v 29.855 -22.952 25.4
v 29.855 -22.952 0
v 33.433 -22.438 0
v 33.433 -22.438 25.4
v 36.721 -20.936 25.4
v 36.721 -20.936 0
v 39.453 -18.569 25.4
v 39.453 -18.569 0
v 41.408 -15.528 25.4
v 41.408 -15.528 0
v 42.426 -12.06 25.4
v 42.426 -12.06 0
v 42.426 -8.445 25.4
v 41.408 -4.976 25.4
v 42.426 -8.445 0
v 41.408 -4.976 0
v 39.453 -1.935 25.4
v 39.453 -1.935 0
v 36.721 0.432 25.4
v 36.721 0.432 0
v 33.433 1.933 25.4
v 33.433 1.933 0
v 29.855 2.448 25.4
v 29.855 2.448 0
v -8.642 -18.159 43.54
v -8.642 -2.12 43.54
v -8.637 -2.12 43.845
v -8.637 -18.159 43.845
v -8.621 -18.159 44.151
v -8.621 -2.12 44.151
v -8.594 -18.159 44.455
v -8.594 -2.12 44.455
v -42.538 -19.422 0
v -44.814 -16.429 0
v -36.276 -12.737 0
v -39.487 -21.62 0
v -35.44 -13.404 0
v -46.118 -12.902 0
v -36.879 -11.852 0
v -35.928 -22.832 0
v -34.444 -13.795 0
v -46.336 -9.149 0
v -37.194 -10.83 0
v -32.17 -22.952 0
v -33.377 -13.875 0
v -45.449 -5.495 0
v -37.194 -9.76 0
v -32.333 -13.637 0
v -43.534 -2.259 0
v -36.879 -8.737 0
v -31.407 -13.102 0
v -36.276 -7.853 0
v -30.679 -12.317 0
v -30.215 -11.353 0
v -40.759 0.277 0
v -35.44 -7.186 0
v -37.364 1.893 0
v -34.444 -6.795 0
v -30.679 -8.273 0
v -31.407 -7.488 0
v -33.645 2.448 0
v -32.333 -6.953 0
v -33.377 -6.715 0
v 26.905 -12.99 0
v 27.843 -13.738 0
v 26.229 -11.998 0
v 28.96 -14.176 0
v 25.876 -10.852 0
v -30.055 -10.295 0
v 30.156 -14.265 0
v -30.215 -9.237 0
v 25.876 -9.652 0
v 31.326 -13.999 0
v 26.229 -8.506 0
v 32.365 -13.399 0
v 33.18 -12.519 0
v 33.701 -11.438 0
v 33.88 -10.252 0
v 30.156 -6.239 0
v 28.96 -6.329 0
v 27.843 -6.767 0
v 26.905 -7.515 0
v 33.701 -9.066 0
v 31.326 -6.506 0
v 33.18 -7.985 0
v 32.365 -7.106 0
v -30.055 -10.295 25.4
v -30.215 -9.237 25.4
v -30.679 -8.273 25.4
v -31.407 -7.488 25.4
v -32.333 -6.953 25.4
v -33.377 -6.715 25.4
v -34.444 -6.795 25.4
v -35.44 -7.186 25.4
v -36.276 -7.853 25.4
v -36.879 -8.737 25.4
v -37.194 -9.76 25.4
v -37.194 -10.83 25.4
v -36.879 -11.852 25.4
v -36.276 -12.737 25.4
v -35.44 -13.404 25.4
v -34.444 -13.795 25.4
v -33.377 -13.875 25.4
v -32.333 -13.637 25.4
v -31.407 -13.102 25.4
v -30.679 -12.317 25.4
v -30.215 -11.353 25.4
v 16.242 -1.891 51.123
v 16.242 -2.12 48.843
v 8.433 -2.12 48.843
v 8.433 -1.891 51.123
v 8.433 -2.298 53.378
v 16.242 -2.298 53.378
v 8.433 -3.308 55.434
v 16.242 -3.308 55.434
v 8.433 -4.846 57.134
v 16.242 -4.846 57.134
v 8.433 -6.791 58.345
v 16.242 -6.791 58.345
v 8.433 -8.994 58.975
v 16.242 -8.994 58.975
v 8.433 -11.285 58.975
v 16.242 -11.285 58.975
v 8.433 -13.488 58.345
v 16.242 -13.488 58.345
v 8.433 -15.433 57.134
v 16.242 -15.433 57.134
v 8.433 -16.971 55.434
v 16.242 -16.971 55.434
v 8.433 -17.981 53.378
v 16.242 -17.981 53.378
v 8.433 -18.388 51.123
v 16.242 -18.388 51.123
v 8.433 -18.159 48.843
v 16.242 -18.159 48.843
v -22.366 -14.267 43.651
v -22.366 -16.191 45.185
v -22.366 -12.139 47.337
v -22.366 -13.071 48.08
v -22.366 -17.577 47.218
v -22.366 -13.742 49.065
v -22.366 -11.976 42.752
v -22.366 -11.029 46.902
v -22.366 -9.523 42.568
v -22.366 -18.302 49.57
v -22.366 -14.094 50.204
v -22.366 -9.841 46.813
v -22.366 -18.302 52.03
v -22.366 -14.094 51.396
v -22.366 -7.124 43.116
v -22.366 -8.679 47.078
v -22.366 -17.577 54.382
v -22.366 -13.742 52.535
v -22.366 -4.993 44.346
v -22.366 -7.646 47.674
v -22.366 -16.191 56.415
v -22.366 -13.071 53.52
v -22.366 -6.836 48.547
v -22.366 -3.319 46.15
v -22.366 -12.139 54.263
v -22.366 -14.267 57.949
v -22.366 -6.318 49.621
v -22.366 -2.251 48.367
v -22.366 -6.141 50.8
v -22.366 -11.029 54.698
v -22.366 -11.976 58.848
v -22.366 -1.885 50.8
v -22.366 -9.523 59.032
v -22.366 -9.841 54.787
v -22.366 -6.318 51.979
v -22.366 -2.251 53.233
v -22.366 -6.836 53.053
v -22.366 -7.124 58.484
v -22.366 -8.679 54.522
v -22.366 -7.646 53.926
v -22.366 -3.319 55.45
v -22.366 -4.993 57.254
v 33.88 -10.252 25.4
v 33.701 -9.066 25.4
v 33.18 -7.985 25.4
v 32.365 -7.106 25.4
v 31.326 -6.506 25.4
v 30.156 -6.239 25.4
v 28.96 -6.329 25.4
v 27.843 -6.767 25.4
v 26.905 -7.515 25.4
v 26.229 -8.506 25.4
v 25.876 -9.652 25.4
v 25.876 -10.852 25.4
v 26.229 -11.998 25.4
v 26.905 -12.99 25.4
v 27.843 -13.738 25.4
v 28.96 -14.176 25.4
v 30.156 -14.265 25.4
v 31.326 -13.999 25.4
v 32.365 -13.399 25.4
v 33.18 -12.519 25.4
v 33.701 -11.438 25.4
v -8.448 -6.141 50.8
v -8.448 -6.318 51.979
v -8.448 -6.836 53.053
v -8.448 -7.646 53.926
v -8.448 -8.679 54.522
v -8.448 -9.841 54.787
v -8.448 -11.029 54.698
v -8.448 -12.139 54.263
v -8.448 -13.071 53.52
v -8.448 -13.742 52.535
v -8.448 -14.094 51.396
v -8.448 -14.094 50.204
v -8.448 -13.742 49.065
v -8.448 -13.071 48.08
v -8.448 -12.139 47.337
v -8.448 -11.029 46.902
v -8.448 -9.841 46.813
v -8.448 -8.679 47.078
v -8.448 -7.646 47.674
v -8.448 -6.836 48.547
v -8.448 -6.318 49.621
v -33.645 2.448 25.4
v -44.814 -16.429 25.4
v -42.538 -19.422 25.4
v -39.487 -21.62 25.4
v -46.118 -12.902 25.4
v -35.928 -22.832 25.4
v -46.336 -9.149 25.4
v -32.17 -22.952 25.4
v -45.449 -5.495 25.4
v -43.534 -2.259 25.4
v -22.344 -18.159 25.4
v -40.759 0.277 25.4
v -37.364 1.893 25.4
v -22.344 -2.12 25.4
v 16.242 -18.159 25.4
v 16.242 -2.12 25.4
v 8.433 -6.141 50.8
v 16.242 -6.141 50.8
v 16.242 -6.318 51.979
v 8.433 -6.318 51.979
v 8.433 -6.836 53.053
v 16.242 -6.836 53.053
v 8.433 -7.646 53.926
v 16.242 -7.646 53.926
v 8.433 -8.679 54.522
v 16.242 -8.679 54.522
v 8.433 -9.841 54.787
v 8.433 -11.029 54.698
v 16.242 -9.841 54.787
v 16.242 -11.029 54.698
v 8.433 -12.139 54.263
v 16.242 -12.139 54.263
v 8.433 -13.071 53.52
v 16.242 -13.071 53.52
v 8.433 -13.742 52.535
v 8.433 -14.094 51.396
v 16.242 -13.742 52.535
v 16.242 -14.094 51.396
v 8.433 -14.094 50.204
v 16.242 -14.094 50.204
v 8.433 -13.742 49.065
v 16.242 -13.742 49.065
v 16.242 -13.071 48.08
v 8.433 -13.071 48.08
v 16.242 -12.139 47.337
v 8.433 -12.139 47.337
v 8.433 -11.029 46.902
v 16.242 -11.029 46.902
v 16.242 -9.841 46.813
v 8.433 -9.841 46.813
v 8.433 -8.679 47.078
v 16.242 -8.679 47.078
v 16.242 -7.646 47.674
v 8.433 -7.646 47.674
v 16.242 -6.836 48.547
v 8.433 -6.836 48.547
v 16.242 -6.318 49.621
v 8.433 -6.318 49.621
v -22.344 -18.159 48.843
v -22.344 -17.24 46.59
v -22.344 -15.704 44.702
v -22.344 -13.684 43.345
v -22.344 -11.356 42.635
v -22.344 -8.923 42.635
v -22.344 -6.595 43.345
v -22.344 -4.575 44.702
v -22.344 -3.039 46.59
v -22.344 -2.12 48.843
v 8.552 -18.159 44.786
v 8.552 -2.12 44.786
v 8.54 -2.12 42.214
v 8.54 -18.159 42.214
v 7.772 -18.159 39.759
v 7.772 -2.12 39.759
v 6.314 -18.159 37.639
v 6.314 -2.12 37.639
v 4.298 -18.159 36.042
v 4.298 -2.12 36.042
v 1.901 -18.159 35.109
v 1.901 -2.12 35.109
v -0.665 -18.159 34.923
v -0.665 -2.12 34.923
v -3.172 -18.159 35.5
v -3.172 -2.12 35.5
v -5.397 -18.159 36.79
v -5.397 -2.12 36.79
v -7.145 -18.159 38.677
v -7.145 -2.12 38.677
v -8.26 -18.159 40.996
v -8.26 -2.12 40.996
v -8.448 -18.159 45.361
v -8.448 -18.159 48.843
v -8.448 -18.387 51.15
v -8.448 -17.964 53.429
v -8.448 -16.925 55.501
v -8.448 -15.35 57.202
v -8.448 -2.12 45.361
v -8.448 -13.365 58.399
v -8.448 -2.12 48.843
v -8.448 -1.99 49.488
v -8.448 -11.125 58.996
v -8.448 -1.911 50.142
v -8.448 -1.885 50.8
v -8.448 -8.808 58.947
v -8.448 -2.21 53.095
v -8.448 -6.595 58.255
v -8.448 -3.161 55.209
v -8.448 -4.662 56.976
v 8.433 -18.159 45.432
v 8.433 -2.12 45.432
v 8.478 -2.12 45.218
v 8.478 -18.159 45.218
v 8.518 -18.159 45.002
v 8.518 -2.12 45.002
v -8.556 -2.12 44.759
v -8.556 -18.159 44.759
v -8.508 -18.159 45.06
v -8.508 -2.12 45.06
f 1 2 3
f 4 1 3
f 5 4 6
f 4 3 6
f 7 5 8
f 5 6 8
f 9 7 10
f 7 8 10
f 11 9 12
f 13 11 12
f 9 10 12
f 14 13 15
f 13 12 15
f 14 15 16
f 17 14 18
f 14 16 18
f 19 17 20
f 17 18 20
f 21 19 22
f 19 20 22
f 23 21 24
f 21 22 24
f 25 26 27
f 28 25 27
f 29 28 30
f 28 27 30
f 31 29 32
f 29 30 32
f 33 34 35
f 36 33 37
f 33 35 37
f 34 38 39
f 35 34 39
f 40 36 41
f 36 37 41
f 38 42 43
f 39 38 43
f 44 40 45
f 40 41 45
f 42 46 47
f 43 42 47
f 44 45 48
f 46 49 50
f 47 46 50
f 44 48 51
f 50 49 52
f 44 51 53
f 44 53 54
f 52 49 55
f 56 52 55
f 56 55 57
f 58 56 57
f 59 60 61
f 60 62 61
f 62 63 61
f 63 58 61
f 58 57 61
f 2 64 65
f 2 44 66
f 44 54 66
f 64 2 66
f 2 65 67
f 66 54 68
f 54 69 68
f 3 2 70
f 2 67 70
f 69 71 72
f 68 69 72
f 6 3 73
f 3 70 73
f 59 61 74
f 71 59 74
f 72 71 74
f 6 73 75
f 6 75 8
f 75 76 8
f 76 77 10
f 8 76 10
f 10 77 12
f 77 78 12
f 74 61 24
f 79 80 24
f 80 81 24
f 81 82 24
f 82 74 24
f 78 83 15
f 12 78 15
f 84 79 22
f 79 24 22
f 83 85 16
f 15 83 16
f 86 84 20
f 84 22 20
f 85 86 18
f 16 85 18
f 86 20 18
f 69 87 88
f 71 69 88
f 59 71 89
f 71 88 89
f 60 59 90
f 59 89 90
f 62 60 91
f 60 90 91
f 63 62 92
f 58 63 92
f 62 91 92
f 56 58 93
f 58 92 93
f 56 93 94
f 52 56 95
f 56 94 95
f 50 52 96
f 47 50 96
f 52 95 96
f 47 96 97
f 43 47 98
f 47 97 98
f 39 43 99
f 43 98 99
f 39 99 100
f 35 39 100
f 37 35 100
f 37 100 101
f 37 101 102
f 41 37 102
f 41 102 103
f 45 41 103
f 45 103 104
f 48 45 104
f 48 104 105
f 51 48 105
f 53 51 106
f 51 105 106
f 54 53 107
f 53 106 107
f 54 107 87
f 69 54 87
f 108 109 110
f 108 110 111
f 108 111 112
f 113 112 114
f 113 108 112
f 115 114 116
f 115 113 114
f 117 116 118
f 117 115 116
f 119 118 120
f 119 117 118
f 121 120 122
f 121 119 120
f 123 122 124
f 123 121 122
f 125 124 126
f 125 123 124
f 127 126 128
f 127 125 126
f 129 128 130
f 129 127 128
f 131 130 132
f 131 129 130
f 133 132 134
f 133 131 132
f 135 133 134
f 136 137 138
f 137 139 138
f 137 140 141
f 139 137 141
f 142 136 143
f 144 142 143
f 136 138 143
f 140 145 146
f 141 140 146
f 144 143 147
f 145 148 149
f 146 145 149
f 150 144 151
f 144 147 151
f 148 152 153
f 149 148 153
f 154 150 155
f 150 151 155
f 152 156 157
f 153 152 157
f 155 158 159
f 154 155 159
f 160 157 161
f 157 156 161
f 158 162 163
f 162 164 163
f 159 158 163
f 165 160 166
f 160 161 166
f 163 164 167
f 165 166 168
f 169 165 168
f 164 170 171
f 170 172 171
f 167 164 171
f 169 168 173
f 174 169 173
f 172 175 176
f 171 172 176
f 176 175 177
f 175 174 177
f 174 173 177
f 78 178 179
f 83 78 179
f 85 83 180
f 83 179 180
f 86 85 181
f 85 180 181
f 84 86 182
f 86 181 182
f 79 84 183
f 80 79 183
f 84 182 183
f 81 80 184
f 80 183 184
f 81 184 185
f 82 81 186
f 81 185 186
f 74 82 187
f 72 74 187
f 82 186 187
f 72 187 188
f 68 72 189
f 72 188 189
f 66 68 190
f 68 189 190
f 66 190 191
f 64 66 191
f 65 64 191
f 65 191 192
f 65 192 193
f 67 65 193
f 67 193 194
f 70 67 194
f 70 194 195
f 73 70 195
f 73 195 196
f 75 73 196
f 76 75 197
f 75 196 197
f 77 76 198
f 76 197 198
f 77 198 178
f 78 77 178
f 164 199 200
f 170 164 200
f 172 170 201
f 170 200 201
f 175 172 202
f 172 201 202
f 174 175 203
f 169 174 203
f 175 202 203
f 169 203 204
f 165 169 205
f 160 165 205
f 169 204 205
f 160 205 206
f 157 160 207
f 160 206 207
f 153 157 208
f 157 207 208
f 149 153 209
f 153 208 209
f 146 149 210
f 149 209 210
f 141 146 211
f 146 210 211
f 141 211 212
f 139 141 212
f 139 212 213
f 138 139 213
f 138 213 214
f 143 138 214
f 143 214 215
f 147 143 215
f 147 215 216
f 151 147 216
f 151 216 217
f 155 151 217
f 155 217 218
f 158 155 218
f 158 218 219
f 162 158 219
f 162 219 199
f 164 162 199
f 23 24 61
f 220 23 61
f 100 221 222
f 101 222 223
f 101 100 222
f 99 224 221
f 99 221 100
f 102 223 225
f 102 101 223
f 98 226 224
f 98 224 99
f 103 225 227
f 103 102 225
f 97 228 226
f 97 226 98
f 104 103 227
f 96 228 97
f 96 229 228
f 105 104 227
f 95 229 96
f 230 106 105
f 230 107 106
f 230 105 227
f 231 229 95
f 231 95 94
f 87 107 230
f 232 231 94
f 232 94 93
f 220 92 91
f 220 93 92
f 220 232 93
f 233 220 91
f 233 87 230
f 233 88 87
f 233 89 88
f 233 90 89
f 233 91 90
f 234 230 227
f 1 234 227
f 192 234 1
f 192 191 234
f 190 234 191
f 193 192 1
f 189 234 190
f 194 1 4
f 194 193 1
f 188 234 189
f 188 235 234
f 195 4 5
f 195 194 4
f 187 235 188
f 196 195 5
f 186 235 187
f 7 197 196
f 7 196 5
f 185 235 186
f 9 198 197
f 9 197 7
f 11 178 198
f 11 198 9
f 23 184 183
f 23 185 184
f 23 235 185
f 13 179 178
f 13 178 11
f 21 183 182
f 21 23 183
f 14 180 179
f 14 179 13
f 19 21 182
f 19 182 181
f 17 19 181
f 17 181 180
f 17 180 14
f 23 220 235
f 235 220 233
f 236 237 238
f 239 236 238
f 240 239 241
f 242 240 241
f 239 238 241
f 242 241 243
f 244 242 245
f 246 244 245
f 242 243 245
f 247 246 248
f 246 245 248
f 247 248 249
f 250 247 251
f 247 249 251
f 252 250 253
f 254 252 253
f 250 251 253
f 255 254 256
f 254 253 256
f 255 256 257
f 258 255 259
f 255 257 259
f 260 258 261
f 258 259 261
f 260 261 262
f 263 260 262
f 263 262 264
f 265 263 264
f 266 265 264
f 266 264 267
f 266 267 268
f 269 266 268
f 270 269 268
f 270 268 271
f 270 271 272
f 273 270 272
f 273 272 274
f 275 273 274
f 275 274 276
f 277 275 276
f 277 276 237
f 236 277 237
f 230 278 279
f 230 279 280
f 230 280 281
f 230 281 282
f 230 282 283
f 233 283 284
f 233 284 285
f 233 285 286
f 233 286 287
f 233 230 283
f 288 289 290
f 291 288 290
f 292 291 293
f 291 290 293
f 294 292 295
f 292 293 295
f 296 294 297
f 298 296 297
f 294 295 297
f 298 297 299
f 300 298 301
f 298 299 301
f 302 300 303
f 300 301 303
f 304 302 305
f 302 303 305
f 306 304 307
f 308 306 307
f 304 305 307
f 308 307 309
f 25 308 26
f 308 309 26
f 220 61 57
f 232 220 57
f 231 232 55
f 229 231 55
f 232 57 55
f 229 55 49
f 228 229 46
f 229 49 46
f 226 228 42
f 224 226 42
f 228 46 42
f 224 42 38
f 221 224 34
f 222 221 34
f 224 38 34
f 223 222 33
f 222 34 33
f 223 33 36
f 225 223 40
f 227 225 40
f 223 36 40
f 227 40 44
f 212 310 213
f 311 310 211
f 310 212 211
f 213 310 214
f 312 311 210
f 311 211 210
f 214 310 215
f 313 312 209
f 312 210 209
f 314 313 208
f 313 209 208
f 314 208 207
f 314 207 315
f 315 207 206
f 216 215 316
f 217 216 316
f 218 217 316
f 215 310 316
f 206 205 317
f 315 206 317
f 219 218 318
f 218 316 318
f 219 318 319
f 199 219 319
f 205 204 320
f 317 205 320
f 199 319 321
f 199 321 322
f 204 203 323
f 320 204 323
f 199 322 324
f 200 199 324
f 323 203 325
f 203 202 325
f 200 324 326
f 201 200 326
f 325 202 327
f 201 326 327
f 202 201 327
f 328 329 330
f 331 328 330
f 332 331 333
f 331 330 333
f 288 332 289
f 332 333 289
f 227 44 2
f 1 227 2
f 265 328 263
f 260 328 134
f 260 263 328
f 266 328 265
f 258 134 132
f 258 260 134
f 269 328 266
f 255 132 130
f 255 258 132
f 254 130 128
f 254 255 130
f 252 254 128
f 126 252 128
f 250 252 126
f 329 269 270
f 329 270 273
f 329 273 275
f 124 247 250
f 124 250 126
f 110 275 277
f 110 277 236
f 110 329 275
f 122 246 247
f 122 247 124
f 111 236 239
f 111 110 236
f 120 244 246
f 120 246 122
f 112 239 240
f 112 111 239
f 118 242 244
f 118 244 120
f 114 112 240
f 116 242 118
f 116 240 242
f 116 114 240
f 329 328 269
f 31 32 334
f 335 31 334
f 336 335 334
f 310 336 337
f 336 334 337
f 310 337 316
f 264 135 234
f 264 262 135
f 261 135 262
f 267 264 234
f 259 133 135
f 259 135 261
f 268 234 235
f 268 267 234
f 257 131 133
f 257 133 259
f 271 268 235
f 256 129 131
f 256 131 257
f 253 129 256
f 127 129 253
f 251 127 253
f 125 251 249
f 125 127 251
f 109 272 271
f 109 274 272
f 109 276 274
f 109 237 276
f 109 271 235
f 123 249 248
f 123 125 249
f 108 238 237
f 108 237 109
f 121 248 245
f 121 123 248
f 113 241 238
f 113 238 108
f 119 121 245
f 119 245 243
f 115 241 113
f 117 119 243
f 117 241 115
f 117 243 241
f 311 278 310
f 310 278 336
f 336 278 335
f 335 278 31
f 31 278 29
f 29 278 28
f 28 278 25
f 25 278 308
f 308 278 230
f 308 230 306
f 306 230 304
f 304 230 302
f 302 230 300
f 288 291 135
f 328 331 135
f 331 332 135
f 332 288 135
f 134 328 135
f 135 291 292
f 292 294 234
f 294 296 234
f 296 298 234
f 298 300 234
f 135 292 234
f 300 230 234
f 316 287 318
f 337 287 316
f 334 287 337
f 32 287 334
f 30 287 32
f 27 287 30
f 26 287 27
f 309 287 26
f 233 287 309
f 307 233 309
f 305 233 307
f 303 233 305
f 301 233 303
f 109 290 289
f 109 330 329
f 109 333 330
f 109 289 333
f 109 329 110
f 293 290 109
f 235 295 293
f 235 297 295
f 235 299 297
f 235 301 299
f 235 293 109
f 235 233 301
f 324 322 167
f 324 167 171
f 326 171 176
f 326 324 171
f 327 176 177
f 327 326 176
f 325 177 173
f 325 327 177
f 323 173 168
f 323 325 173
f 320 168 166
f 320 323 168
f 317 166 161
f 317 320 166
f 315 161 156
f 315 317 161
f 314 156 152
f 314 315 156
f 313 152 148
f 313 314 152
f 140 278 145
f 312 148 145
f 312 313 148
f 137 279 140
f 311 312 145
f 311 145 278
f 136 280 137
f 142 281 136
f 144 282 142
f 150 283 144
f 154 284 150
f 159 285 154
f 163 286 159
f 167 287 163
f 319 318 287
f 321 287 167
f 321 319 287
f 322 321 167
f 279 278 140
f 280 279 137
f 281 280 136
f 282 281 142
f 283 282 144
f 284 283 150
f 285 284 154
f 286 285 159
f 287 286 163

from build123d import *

# Parameters (mm, degrees)
F1_DEPTH  = 25.4
F2_R      = 4.0245383541
F2_R_2    = 3.5896657287
F3_DEPTH  = 25.4
F4_W      = 38.5861545801
F4_H      = 16.0388713703
F5_DEPTH  = 25.4
F6_R      = 8.2548024602
F7_DEPTH  = 38.608
F8_R      = 3.9986797271
F9_DEPTH  = 39.878
F11_DEPTH = 45.212
F12_W     = 16.8811818585
F12_H     = 20.1899148524
F13_DEPTH = 34.29


with BuildPart() as f1:
    # F0 (on Top) → F1 (new body)
    with BuildSketch(Plane.XY):
        with BuildLine():
            ThreePointArc((-29.85904102, -10.2949963908), (-30.9678519001, -7.618090126), (-33.6447581649, -6.5092792459))
            Line((-33.6447581649, -6.5092792459), (-33.6447581649, -14.0807135357))
            ThreePointArc((-33.6447581649, -14.0807135357), (-30.9678519001, -12.9719026556), (-29.85904102, -10.2949963908))
        make_face()
        with BuildLine():
            Line((29.8552418351, -14.3785462744), (29.8552418351, -6.1258107119))
            ThreePointArc((29.8552418351, -6.1258107119), (25.7288740539, -10.2521784931), (29.8552418351, -14.3785462744))
        make_face()
        with BuildLine():
            Line((-33.6447581649, -14.0807135357), (-33.6447581649, -6.5092792459))
            ThreePointArc((-33.6447581649, -6.5092792459), (-37.4304753098, -10.2949963908), (-33.6447581649, -14.0807135357))
        make_face()
        with BuildLine():
            ThreePointArc((33.9816096163, -10.2521784931), (32.7730244749, -7.3343958534), (29.8552418351, -6.1258107119))
            Line((29.8552418351, -6.1258107119), (29.8552418351, -14.3785462744))
            ThreePointArc((29.8552418351, -14.3785462744), (32.7730244749, -13.1699611329), (33.9816096163, -10.2521784931))
        make_face()
        with BuildLine():
            Line((29.8552418351, 2.4478215069), (-33.6447581649, 2.4478215069))
            Line((-33.6447581649, 2.4478215069), (-33.6447581649, -6.5092792459))
            ThreePointArc((-33.6447581649, -6.5092792459), (-30.9678519001, -7.618090126), (-29.85904102, -10.2949963908))
            ThreePointArc((-29.85904102, -10.2949963908), (-30.9678519001, -12.9719026556), (-33.6447581649, -14.0807135357))
            Line((-33.6447581649, -14.0807135357), (-33.6447581649, -22.9521784931))
            Line((-33.6447581649, -22.9521784931), (-32.169919461, -22.9521784931))
            Line((-32.169919461, -22.9521784931), (29.8552418351, -22.9521784931))
            Line((29.8552418351, -22.9521784931), (29.8552418351, -14.3785462744))
            ThreePointArc((29.8552418351, -14.3785462744), (25.7288740539, -10.2521784931), (29.8552418351, -6.1258107119))
            Line((29.8552418351, -6.1258107119), (29.8552418351, 2.4478215069))
        make_face()
        with BuildLine():
            ThreePointArc((29.8552418351, -22.9521784931), (42.5552418351, -10.2521784931), (29.8552418351, 2.4478215069))
            Line((29.8552418351, 2.4478215069), (29.8552418351, -6.1258107119))
            ThreePointArc((29.8552418351, -6.1258107119), (32.7730244749, -7.3343958534), (33.9816096163, -10.2521784931))
            ThreePointArc((33.9816096163, -10.2521784931), (32.7730244749, -13.1699611329), (29.8552418351, -14.3785462744))
            Line((29.8552418351, -14.3785462744), (29.8552418351, -22.9521784931))
        make_face()
        with BuildLine():
            Line((-33.6447581649, -6.5092792459), (-33.6447581649, 2.4478215069))
            ThreePointArc((-33.6447581649, 2.4478215069), (-46.3661490991, -11.033657797), (-32.169919461, -22.9521784931))
            Line((-32.169919461, -22.9521784931), (-33.6447581649, -22.9521784931))
            Line((-33.6447581649, -22.9521784931), (-33.6447581649, -14.0807135357))
            ThreePointArc((-33.6447581649, -14.0807135357), (-37.4304753098, -10.2949963908), (-33.6447581649, -6.5092792459))
        make_face()
    extrude(amount=F1_DEPTH)

    # F2 (on face) → F3 (cut)
    with BuildSketch(Plane.XY.offset(25.4)):
        with Locations((29.8552418351, -10.2521784931)):
            Circle(F2_R)
        with Locations((-33.6447581649, -10.2949963908)):
            Circle(F2_R_2)
    extrude(amount=-F3_DEPTH, mode=Mode.SUBTRACT)

    # F4 (on face) → F5 (join)
    with BuildSketch(Plane.XY.offset(25.4)):
        with Locations((-3.0512139201, -10.1395160891)):
            Rectangle(F4_W, F4_H)
    extrude(amount=F5_DEPTH)

    # F6 (on face) → F7 (join)
    with BuildSketch(Plane.YZ.offset(16.2418633699)):
        with Locations((-10.1395160891, 50.8)):
            Circle(F6_R)
    extrude(amount=-F7_DEPTH)

    # F8 (on face) → F9 (cut)
    with BuildSketch(Plane.YZ.offset(16.2418633699)):
        with Locations((-10.1395160891, 50.8)):
            Circle(F8_R)
    extrude(amount=-F9_DEPTH, mode=Mode.SUBTRACT)

    # F10 (on face) → F11 (cut)
    with BuildSketch(Plane(origin=(0, -2.120080404, 0), x_dir=(-1, 0, 0), z_dir=(0, 1, 0))):
        with BuildLine():
            Line((-6.8240375897, 48.8428554092), (6.8240375897, 48.8428554092))
            ThreePointArc((6.8240375897, 48.8428554092), (0, 52.1820532111), (-6.8240375897, 48.8428554092))
        make_face()
        with BuildLine():
            ThreePointArc((-8.5521200951, 44.7858986511), (-0.6247847998, 34.9197571743), (8.6424546269, 43.5395985842))
            ThreePointArc((8.6424546269, 43.5395985842), (8.6302911684, 43.9979612418), (8.593835031, 44.455033693))
            ThreePointArc((8.593835031, 44.455033693), (8.0150448464, 46.772411305), (6.8240375897, 48.8428554092))
            Line((6.8240375897, 48.8428554092), (-6.8240375897, 48.8428554092))
            ThreePointArc((-6.8240375897, 48.8428554092), (-7.951181096, 46.9264468472), (-8.5521200951, 44.7858986511))
        make_face()
    extrude(amount=-F11_DEPTH, mode=Mode.SUBTRACT)

    # F12 (on Front) → F13 (cut)
    with BuildSketch(Plane.XZ):
        with Locations((-0.0078589655, 53.0204232782)):
            Rectangle(F12_W, F12_H)
    extrude(amount=F13_DEPTH, mode=Mode.SUBTRACT)


solid = f1.part
